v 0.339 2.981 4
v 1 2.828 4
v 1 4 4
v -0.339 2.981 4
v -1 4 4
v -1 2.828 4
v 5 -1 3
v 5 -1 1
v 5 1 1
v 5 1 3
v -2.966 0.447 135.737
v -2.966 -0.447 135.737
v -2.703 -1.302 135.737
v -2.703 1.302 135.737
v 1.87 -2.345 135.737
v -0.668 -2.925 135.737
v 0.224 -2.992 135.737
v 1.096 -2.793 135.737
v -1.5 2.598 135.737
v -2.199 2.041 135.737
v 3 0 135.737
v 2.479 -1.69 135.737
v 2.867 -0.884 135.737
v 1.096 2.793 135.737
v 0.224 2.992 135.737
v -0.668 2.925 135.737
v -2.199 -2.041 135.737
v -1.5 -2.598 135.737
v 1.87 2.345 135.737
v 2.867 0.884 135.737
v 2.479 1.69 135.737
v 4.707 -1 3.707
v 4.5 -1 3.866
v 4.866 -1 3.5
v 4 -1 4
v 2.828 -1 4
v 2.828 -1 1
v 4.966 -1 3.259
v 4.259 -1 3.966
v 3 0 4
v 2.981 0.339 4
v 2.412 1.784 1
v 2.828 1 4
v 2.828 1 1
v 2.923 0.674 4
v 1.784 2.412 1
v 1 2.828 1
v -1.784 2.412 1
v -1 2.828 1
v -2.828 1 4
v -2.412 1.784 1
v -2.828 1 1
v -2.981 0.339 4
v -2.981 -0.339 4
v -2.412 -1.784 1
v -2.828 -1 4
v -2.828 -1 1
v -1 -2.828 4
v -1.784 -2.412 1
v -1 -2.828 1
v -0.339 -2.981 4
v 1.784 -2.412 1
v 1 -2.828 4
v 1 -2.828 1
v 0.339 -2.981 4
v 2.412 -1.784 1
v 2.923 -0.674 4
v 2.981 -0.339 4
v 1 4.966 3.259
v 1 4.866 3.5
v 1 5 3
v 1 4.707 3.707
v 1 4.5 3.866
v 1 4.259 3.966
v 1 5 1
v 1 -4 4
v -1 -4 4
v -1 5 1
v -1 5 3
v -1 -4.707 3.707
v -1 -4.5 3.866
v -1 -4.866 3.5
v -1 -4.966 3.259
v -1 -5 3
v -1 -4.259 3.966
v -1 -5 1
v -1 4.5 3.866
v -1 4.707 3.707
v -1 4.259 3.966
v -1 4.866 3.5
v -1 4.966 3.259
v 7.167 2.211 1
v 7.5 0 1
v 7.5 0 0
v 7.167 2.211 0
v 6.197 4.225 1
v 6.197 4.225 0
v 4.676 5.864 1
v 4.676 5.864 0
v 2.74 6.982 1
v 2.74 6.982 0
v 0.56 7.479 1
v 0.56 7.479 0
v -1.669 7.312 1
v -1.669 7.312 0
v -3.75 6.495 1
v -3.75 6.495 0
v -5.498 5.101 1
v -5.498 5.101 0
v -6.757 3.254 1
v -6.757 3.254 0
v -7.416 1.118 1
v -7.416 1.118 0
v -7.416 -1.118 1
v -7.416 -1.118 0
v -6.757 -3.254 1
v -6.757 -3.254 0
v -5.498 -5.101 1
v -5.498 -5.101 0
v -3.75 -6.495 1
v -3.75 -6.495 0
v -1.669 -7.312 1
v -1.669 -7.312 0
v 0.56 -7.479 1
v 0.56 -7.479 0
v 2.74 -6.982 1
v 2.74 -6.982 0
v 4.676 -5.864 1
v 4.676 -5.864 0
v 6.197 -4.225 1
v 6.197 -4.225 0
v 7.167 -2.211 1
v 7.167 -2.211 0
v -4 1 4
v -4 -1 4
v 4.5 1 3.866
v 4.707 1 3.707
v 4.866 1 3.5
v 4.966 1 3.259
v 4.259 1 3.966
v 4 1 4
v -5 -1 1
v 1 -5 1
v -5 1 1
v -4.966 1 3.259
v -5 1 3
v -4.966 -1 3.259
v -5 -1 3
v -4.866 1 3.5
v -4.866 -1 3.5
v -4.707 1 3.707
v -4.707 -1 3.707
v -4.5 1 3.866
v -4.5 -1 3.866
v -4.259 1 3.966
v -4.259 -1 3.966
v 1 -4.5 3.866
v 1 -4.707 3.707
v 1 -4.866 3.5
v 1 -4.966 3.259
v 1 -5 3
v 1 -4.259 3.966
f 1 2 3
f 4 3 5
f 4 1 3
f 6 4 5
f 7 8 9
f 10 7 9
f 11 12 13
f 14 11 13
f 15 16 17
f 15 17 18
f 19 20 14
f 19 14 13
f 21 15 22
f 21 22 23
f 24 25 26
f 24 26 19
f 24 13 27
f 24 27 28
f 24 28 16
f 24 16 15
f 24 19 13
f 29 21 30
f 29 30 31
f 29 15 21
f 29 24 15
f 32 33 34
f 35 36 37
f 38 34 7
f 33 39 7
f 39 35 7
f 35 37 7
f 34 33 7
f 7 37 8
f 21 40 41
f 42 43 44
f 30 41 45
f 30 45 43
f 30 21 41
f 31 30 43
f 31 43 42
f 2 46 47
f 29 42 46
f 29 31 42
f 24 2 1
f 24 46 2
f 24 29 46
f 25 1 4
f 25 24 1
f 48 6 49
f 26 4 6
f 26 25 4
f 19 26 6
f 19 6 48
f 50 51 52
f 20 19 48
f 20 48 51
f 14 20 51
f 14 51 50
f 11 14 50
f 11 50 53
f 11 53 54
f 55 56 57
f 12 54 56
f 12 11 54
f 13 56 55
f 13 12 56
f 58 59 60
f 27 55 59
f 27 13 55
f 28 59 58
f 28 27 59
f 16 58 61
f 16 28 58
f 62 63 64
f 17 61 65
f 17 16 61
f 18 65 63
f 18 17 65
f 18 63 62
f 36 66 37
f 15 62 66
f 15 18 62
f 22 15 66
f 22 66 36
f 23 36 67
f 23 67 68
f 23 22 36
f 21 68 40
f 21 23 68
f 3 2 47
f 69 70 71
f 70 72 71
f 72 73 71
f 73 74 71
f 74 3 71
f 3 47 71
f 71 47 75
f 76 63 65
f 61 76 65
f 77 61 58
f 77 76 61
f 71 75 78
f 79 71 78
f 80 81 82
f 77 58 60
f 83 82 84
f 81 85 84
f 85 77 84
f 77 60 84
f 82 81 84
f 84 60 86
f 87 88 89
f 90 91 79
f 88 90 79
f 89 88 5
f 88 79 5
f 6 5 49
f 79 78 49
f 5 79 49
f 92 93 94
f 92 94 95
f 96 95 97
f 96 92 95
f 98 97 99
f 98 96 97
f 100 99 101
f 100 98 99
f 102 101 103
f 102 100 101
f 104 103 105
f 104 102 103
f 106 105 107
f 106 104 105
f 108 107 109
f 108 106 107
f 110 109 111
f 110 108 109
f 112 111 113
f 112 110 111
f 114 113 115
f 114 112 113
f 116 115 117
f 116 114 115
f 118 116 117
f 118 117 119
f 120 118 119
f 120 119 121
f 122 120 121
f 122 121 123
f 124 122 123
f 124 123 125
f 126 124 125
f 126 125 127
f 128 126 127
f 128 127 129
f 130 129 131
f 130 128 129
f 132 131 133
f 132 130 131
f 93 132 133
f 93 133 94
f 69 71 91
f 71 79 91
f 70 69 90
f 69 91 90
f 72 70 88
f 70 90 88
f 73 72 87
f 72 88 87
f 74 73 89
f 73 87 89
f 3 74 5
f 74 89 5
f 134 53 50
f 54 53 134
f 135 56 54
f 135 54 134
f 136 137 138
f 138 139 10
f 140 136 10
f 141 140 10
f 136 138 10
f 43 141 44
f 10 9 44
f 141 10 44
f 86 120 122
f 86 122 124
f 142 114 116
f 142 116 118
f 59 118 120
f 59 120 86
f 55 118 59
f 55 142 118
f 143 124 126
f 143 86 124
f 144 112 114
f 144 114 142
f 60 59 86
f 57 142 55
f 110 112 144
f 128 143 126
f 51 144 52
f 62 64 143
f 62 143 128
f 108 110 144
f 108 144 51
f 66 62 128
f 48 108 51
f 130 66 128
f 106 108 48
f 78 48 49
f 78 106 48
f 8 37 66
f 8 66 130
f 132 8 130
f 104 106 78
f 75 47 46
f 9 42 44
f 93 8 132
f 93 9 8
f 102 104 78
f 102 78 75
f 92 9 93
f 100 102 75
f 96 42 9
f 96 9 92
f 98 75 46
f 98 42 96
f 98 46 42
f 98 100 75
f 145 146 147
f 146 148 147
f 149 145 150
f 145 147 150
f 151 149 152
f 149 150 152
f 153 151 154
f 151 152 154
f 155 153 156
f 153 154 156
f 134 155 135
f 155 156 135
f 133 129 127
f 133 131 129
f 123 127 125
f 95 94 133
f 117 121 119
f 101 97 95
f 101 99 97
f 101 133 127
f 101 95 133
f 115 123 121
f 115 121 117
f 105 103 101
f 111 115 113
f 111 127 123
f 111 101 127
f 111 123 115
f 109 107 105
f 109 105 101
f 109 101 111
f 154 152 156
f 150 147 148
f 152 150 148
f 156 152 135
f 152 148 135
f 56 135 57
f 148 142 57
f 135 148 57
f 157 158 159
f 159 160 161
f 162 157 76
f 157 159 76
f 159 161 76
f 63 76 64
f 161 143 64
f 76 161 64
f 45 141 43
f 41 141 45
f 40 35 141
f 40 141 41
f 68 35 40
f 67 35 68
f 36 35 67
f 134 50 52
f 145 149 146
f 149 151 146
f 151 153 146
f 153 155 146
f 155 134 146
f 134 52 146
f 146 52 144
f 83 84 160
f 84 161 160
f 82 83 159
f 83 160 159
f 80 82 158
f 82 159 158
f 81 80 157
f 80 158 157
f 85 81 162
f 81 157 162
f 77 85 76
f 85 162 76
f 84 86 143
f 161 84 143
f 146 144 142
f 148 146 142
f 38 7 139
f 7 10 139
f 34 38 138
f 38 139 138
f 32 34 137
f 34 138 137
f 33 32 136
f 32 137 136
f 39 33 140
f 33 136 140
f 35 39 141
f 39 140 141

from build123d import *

# Parameters (mm, degrees)
PAD002_DEPTH = 3
FILLET003_R  = 1


with BuildPart() as revolution001:
    # Sketch005 → Revolution001 (revolve)
    with BuildSketch(Plane.XZ):
        Polygon((0, 0), (7.5, 0), (7.5, 1), (3, 1), (3, 135.736657), (0, 135.736657), align=None)
    revolve(axis=Axis((0, 0, 0), (0, 0, 1)))


with BuildPart() as pad002:
    # Pad002 base: copy of Revolution001
    add(revolution001.part)

    # Sketch006 → Pad002 (new body)
    with BuildSketch(Plane(origin=(0, 0, 1), x_dir=(-1, 0, 0), z_dir=(0, 0, 1))):
        Polygon((-5, 1), (-5, -1), (-1, -1), (-1, -5), (1, -5), (1, -1), (5, -1), (5, 1), (1, 1), (1, 5), (-1, 5), (-1, 1), align=None)
    extrude(amount=PAD002_DEPTH)


with BuildPart() as fillet003:
    # Fusion001 base: copy of Revolution001
    add(revolution001.part)

    # Fusion001: union Pad002
    add(pad002.part)

    # Fillet003
    fillet003_edges = [fillet003.edges().sort_by_distance(p)[0] for p in [
        (0, 5, 4),
        (-5, 0, 4),
        (0, -5, 4),
        (5, 0, 4),
    ]]
    fillet(fillet003_edges, radius=FILLET003_R)


solid = fillet003.part
